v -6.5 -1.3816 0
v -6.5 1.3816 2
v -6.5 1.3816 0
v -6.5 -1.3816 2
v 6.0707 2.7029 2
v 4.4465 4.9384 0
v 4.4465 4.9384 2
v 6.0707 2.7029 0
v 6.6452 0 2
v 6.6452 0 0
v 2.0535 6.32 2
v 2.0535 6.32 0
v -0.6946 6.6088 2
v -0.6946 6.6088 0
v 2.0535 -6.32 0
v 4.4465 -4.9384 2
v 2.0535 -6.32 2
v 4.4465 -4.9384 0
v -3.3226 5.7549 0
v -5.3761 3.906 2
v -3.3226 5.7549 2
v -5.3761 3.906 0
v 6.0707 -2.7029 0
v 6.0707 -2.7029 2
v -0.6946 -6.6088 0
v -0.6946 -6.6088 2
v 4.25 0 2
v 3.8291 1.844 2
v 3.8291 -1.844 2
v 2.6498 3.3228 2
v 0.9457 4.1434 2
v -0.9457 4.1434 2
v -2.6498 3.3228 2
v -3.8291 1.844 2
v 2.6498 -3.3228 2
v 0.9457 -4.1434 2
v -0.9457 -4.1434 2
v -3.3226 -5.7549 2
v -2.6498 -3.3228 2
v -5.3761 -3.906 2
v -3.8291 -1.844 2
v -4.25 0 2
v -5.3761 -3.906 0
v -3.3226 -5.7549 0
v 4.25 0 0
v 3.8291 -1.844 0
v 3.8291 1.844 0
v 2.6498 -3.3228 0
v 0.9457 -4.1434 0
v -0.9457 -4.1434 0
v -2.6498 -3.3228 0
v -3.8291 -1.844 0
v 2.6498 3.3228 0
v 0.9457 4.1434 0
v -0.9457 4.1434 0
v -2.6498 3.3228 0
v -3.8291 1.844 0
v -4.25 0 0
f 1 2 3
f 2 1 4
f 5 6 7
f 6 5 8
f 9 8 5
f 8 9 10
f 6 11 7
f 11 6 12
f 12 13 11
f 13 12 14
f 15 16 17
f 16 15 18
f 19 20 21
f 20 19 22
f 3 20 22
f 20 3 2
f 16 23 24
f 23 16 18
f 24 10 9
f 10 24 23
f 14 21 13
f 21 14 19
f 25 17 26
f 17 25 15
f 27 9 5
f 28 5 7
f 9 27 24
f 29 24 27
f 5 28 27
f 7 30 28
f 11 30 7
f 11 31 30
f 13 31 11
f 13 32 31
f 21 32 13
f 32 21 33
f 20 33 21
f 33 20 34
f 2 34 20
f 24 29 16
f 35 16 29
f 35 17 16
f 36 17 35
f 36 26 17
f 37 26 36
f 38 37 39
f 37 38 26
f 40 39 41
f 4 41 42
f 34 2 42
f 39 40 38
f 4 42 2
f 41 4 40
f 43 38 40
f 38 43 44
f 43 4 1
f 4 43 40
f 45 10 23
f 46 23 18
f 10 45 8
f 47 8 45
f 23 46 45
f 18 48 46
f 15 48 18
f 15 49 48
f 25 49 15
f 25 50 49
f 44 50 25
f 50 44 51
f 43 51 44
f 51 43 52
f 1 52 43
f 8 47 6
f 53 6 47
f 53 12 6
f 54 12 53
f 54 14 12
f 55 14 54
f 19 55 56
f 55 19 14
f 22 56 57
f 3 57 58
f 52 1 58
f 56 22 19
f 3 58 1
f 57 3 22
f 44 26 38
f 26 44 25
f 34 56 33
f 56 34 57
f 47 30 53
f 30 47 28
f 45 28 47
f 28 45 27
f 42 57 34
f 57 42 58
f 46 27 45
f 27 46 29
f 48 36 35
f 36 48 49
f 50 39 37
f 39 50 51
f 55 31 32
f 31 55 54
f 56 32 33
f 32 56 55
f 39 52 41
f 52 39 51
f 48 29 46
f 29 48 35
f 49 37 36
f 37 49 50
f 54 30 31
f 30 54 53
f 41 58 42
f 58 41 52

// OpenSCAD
module cylinder_outer(h,d=undef,d1=undef,d2=undef,fn=15) {
	fudge = cos(180/fn);
	cylinder(h=h,d=d/fudge,d1=d1/fudge,d2=d2/fudge,$fn=fn);
}

module hole(d, height, countersink=0, extra_above=false) {
	height = height - countersink;
	translate([0, 0, -(height+countersink)]) {
		translate([0, 0, height+0.001]) cylinder_outer(d1=d, d2=d*1.5, h=countersink);
		if (extra_above) {
			translate([0, 0, height+0.001]) cylinder_outer(d1=d, d2=d*2, h=countersink*3/2);
		}
		if (height > 0)
			translate([0, 0, -2]) cylinder_outer(d=d, h=height+2.1);
	}
}

module nut_trap(w, h, sides, center=false){
	cylinder(r = w / 2 / cos(180 / 6) + 0.05, h=h, $fn=6, center=center);
}

module rim(id, od, h) {
	difference() {
		cylinder_outer(h=h, d=od);
		translate([0, 0, -1]) cylinder(h=h+2, d=id);
	}
}

rim(8.5, 13, 2);
